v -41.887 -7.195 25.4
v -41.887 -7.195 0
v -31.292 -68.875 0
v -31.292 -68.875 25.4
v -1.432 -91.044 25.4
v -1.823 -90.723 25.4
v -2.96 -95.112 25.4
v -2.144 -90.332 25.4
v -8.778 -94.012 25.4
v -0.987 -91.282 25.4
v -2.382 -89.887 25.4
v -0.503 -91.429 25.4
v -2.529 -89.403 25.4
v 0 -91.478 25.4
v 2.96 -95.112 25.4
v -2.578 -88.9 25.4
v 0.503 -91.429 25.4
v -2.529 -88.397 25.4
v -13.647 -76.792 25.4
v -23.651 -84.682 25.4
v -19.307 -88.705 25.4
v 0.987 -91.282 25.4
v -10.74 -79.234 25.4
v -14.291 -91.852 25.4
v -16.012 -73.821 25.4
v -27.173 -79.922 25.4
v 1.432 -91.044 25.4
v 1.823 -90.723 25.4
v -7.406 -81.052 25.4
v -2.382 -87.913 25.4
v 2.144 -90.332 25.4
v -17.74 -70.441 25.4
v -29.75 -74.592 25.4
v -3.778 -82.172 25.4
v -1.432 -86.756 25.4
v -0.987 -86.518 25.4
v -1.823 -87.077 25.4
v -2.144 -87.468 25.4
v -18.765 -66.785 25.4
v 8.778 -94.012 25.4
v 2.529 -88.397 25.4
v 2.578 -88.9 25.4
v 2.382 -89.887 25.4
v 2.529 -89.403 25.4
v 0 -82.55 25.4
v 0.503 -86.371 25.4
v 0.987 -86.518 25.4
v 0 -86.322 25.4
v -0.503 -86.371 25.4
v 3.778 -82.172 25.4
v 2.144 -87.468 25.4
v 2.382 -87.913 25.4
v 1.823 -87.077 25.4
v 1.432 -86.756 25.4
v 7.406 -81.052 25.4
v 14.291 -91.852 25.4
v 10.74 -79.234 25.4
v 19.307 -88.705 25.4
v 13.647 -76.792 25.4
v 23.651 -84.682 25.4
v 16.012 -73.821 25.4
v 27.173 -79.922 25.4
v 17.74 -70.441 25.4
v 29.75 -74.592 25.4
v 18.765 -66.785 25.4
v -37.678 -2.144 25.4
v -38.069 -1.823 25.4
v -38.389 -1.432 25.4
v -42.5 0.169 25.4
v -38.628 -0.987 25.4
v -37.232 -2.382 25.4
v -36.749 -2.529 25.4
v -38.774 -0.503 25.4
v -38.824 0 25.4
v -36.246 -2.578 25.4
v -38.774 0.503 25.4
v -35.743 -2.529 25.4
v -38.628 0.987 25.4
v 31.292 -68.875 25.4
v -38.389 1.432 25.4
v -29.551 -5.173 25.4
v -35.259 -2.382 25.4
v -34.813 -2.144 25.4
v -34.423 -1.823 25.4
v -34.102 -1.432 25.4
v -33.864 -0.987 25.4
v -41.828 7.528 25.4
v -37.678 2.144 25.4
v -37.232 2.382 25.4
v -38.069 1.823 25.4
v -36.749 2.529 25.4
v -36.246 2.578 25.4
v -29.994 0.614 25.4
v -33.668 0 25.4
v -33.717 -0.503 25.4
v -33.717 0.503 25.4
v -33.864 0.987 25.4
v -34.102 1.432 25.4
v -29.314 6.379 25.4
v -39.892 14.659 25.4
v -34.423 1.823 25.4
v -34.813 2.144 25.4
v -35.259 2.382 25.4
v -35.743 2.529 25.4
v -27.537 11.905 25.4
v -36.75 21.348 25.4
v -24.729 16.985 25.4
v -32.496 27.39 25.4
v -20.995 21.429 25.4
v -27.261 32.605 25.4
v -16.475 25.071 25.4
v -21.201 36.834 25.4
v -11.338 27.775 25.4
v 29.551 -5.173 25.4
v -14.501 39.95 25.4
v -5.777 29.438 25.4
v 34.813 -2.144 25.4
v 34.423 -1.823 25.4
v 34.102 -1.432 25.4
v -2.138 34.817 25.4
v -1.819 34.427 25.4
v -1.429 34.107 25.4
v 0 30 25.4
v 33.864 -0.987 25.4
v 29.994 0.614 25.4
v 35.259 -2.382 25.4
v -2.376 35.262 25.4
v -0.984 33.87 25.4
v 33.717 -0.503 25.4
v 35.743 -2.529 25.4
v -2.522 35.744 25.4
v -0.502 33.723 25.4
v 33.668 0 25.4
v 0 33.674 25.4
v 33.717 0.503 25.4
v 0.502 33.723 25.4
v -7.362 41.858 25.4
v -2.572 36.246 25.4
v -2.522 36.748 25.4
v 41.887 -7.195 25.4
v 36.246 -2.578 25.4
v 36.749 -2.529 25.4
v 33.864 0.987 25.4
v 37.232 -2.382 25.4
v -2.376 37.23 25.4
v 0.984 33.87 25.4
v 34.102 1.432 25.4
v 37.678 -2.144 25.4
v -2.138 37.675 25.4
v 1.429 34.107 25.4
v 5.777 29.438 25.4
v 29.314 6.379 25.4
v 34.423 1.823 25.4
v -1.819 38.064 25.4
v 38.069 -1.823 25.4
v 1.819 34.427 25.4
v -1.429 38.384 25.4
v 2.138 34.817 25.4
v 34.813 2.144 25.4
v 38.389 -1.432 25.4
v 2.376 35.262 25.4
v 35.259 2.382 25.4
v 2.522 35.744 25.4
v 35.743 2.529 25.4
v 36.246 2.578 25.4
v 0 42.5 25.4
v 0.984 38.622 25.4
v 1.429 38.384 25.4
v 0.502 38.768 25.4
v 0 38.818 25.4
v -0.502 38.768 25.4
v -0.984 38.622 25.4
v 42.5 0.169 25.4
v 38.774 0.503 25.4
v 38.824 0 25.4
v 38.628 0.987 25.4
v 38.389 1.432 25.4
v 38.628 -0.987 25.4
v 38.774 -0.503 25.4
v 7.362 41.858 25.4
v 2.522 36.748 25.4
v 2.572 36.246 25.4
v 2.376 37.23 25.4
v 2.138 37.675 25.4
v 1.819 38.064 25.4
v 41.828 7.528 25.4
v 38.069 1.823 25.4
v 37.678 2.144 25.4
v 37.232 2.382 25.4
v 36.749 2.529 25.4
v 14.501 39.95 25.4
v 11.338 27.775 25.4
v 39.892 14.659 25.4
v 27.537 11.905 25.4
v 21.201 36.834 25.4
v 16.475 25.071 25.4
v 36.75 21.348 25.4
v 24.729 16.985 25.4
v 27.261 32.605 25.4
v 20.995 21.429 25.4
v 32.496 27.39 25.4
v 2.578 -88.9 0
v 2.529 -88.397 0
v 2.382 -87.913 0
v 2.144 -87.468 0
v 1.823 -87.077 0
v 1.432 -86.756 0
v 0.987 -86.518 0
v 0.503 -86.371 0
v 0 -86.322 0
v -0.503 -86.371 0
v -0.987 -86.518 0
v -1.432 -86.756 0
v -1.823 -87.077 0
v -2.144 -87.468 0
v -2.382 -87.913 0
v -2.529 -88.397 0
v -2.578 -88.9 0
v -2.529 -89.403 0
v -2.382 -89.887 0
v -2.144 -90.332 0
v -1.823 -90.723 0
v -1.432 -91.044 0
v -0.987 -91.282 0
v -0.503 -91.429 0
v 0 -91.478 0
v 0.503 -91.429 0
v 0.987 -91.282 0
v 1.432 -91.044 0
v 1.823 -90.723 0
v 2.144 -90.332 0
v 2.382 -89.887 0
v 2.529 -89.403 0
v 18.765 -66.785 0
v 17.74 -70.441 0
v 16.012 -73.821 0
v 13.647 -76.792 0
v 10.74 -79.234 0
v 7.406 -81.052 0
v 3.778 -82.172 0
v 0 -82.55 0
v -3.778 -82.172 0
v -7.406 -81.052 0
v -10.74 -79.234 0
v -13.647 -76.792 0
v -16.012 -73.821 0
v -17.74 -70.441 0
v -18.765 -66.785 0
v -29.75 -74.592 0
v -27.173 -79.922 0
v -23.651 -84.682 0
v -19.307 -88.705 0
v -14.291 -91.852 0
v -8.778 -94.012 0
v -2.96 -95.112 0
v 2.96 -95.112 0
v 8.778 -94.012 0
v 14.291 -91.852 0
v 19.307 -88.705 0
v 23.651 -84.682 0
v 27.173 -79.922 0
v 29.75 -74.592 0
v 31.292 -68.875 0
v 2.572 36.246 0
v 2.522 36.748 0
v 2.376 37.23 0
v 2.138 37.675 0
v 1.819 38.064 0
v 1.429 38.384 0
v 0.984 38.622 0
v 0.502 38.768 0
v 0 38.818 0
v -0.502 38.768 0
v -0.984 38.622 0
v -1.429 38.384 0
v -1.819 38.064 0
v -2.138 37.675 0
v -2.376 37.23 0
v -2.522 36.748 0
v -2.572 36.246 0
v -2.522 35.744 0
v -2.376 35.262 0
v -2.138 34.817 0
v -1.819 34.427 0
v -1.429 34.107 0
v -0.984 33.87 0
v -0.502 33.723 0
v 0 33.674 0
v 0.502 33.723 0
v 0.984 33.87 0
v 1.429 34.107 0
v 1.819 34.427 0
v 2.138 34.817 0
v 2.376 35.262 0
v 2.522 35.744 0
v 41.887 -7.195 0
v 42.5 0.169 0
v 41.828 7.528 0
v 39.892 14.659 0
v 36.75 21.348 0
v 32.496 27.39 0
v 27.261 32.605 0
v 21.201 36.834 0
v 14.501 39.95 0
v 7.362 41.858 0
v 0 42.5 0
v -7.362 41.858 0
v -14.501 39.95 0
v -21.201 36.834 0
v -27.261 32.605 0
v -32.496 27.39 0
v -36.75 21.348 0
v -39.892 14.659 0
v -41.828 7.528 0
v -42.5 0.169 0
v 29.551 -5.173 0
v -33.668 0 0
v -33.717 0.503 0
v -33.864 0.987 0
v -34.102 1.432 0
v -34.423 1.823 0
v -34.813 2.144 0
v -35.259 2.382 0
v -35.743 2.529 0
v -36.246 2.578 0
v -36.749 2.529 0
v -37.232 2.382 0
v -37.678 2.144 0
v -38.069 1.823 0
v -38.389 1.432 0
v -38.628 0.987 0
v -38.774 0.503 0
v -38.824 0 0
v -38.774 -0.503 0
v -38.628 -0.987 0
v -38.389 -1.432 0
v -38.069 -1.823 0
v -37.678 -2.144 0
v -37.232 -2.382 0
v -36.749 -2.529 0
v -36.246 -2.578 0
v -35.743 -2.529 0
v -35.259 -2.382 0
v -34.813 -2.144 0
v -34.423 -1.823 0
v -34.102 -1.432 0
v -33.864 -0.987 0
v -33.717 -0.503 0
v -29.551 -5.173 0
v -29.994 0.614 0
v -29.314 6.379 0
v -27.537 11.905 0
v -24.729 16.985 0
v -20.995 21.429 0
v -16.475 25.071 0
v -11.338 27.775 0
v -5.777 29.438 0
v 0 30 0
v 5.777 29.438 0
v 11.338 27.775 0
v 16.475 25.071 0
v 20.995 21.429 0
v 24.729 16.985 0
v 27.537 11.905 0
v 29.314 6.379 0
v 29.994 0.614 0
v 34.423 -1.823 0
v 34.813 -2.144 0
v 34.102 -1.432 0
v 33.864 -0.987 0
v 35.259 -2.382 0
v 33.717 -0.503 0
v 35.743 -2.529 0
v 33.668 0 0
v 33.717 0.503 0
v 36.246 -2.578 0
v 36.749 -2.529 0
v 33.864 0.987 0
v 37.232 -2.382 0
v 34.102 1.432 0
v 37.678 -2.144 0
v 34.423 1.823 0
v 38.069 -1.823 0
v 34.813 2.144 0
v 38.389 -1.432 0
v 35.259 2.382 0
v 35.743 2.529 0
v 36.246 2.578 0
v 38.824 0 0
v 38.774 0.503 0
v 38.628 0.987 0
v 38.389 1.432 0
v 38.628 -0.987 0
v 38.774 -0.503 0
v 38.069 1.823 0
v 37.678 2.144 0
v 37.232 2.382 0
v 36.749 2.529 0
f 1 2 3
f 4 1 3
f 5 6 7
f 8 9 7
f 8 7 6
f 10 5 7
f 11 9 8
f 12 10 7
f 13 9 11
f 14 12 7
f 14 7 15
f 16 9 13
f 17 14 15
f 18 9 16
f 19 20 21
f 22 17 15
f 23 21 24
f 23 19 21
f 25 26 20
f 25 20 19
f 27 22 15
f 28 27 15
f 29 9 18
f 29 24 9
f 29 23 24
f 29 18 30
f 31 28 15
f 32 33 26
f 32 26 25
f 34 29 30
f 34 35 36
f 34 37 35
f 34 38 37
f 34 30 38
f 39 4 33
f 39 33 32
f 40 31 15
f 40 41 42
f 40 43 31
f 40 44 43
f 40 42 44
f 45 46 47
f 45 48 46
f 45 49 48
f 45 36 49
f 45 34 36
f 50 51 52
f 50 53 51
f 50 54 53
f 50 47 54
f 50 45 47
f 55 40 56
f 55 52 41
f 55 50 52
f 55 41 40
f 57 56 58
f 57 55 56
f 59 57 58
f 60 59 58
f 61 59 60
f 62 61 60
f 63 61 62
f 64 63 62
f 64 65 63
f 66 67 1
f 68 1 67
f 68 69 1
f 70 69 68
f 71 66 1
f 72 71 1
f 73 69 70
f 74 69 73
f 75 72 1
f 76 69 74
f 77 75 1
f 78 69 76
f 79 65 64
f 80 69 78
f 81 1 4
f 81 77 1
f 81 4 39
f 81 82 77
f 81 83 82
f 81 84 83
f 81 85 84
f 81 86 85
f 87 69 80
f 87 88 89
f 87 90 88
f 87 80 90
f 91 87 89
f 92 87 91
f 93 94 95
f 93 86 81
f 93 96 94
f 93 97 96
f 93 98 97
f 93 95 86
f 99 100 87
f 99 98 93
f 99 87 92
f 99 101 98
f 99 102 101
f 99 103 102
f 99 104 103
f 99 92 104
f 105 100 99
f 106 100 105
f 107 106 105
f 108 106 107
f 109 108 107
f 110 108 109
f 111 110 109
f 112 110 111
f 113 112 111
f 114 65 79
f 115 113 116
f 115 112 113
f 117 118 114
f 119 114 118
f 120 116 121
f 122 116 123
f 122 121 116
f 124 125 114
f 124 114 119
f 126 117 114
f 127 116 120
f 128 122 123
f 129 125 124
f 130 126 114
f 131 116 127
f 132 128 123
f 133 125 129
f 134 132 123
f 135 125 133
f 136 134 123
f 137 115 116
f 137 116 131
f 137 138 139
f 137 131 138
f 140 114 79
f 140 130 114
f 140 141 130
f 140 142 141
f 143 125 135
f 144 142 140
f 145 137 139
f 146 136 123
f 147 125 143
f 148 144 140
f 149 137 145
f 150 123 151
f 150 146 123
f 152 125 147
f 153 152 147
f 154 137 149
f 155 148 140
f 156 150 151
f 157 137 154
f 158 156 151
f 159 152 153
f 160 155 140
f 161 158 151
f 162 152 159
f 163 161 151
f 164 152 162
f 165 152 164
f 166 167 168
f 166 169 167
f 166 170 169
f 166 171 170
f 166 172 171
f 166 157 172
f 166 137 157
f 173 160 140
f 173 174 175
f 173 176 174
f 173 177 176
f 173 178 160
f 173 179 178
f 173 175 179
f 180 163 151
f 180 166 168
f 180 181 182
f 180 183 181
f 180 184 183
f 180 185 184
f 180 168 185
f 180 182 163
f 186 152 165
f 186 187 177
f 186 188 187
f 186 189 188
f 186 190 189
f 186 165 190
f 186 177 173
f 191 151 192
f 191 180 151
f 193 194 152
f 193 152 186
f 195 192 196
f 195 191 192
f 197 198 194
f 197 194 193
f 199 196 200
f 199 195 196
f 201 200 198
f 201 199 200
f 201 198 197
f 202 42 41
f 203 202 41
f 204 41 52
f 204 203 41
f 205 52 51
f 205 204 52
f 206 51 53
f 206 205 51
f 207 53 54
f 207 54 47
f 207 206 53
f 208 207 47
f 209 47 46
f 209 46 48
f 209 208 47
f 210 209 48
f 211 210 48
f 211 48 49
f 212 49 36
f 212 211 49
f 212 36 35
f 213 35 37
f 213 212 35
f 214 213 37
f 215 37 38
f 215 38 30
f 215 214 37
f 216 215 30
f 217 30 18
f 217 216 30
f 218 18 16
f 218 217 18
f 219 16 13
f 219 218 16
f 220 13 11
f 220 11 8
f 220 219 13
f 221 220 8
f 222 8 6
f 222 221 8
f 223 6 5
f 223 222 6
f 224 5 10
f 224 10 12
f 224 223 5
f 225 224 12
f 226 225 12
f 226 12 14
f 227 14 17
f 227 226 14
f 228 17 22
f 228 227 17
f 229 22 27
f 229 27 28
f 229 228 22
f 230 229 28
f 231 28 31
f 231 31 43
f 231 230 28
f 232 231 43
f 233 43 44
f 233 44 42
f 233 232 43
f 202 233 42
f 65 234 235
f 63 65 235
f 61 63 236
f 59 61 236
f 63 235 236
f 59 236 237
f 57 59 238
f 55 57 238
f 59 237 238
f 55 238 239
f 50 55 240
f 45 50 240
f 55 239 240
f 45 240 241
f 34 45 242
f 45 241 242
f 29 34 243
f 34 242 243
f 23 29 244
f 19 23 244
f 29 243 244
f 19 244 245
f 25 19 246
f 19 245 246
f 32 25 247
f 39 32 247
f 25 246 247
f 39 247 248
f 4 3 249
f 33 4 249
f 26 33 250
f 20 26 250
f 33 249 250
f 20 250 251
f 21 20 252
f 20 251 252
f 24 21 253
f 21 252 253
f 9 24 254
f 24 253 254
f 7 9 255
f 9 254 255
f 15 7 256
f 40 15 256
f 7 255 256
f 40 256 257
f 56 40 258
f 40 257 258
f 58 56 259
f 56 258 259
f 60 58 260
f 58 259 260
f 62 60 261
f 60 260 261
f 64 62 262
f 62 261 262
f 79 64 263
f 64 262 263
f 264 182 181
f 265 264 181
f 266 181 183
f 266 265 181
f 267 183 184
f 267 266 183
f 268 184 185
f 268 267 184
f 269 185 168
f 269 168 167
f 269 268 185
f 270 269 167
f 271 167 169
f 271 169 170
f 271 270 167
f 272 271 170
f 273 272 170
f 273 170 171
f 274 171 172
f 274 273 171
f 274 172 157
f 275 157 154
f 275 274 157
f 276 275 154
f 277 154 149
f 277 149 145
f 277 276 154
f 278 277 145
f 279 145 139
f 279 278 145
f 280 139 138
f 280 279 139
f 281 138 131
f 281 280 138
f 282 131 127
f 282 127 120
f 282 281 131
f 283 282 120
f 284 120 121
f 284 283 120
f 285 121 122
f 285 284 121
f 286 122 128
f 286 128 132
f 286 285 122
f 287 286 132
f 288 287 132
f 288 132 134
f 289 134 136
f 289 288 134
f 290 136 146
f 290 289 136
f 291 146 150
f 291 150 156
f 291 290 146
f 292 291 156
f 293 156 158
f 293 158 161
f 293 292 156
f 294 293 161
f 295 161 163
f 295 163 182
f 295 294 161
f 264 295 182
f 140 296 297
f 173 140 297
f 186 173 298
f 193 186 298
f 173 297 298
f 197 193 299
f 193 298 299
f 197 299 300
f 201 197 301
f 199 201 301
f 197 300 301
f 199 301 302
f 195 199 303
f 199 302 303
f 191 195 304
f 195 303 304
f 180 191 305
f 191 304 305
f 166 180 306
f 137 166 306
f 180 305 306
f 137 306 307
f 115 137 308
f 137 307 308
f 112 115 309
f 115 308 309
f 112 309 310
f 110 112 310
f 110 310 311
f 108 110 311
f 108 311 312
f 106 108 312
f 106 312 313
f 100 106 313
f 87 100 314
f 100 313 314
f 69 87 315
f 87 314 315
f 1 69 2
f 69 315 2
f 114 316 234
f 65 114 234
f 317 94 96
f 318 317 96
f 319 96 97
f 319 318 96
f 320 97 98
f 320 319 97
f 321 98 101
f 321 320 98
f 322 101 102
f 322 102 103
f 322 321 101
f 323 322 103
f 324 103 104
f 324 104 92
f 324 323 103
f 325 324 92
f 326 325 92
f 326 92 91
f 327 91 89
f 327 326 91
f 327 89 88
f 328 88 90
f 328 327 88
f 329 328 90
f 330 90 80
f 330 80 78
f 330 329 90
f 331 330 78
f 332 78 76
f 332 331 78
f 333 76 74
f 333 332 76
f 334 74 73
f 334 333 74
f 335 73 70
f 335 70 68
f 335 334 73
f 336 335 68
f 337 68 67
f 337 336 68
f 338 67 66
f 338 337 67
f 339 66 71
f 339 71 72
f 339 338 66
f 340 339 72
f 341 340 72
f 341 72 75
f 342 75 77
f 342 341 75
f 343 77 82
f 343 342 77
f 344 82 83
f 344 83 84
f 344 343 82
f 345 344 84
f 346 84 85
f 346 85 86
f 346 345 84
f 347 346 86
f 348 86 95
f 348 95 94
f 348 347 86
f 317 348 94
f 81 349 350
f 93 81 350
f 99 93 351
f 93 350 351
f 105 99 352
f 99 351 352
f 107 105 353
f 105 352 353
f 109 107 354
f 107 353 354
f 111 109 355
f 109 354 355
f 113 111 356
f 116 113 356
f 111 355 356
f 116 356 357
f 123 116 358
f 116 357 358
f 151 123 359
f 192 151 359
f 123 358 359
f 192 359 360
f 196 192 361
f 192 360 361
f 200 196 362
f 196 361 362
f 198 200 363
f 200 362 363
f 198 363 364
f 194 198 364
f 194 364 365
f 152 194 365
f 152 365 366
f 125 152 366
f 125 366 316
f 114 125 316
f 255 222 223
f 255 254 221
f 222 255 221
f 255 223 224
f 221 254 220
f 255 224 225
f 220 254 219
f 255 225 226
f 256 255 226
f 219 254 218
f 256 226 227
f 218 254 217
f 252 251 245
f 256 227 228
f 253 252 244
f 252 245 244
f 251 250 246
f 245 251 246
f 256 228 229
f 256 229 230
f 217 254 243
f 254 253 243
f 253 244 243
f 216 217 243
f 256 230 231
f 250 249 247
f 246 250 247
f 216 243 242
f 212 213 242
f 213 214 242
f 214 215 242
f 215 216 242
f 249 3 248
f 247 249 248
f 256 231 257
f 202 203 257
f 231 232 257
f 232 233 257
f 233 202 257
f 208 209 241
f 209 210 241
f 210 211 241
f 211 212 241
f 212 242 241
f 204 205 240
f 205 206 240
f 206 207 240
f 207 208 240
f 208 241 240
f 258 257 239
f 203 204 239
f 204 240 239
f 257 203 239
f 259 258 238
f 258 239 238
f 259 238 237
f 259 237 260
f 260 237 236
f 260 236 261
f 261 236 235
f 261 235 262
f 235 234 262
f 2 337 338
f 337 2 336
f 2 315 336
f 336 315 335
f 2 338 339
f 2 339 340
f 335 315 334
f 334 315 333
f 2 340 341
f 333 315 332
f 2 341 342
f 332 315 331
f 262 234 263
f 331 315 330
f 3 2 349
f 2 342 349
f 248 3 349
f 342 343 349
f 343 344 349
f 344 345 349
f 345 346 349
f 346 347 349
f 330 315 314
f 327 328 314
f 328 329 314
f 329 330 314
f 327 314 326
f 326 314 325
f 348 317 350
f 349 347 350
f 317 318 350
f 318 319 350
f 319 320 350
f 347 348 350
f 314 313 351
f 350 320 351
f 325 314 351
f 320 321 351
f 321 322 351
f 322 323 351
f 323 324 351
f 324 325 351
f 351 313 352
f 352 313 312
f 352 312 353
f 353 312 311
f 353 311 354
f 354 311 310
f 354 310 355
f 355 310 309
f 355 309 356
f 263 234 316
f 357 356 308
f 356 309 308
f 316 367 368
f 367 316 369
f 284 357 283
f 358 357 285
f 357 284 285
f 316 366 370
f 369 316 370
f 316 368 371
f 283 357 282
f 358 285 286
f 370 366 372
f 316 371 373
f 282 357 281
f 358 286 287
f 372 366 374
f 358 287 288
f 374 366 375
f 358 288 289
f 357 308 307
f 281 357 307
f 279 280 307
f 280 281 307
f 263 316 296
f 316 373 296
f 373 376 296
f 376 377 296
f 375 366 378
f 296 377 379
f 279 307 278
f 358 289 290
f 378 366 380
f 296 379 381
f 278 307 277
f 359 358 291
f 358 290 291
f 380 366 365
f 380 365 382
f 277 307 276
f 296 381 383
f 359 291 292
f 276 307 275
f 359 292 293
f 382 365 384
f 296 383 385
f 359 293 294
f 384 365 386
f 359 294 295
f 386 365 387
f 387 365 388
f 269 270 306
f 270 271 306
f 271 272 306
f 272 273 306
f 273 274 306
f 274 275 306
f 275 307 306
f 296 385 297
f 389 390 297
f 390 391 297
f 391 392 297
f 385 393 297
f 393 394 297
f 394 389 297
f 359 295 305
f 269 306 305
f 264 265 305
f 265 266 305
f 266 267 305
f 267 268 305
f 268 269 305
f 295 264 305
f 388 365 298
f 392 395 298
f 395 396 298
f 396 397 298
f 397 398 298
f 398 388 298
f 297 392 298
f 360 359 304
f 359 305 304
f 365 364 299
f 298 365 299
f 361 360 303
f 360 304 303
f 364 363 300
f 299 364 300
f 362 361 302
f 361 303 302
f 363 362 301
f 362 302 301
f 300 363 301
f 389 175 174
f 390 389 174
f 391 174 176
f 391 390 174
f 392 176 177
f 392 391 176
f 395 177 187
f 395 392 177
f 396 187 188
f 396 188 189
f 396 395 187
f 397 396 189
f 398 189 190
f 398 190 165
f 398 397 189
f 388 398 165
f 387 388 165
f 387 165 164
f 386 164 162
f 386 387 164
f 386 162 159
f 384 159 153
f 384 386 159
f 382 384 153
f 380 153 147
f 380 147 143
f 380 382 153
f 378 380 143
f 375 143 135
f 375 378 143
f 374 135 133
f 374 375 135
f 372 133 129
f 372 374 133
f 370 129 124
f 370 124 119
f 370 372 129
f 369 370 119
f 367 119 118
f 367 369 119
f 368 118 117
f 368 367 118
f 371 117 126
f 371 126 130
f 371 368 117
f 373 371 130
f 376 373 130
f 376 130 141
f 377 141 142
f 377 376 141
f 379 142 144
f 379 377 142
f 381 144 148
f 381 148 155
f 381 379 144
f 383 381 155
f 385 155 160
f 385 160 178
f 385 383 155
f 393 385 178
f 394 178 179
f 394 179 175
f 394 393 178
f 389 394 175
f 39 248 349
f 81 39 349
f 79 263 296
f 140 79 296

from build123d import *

# Parameters (mm, degrees)
F0_R     = 2.5781
F0_R_2   = 2.57175
F1_DEPTH = 25.4


with BuildPart() as f1:
    # F0 (on Top) → F1 (new body)
    with BuildSketch(Plane.XY):
        with BuildLine():
            ThreePointArc((-31.291722, -68.875), (0, -95.25), (31.291722, -68.875))
            Line((31.291722, -68.875), (41.886557, -7.194882))
            ThreePointArc((41.886557, -7.194882), (0, 42.5), (-41.886557, -7.194882))
            Line((-41.886557, -7.194882), (-31.291722, -68.875))
        make_face()
        with Locations((0, -88.9)):
            Circle(F0_R, mode=Mode.SUBTRACT)
        with Locations((-36.2458, 0)):
            Circle(F0_R, mode=Mode.SUBTRACT)
        with BuildLine():
            ThreePointArc((-29.550596, -5.173228), (0, 30), (29.550596, -5.173228))
            Line((29.550596, -5.173228), (18.764628, -66.785))
            ThreePointArc((18.764628, -66.785), (0, -82.55), (-18.764628, -66.785))
            Line((-18.764628, -66.785), (-29.550596, -5.173228))
        make_face(mode=Mode.SUBTRACT)
        with Locations((36.2458, 0)):
            Circle(F0_R, mode=Mode.SUBTRACT)
        with Locations((0, 36.2458)):
            Circle(F0_R_2, mode=Mode.SUBTRACT)
    extrude(amount=F1_DEPTH)


solid = f1.part
